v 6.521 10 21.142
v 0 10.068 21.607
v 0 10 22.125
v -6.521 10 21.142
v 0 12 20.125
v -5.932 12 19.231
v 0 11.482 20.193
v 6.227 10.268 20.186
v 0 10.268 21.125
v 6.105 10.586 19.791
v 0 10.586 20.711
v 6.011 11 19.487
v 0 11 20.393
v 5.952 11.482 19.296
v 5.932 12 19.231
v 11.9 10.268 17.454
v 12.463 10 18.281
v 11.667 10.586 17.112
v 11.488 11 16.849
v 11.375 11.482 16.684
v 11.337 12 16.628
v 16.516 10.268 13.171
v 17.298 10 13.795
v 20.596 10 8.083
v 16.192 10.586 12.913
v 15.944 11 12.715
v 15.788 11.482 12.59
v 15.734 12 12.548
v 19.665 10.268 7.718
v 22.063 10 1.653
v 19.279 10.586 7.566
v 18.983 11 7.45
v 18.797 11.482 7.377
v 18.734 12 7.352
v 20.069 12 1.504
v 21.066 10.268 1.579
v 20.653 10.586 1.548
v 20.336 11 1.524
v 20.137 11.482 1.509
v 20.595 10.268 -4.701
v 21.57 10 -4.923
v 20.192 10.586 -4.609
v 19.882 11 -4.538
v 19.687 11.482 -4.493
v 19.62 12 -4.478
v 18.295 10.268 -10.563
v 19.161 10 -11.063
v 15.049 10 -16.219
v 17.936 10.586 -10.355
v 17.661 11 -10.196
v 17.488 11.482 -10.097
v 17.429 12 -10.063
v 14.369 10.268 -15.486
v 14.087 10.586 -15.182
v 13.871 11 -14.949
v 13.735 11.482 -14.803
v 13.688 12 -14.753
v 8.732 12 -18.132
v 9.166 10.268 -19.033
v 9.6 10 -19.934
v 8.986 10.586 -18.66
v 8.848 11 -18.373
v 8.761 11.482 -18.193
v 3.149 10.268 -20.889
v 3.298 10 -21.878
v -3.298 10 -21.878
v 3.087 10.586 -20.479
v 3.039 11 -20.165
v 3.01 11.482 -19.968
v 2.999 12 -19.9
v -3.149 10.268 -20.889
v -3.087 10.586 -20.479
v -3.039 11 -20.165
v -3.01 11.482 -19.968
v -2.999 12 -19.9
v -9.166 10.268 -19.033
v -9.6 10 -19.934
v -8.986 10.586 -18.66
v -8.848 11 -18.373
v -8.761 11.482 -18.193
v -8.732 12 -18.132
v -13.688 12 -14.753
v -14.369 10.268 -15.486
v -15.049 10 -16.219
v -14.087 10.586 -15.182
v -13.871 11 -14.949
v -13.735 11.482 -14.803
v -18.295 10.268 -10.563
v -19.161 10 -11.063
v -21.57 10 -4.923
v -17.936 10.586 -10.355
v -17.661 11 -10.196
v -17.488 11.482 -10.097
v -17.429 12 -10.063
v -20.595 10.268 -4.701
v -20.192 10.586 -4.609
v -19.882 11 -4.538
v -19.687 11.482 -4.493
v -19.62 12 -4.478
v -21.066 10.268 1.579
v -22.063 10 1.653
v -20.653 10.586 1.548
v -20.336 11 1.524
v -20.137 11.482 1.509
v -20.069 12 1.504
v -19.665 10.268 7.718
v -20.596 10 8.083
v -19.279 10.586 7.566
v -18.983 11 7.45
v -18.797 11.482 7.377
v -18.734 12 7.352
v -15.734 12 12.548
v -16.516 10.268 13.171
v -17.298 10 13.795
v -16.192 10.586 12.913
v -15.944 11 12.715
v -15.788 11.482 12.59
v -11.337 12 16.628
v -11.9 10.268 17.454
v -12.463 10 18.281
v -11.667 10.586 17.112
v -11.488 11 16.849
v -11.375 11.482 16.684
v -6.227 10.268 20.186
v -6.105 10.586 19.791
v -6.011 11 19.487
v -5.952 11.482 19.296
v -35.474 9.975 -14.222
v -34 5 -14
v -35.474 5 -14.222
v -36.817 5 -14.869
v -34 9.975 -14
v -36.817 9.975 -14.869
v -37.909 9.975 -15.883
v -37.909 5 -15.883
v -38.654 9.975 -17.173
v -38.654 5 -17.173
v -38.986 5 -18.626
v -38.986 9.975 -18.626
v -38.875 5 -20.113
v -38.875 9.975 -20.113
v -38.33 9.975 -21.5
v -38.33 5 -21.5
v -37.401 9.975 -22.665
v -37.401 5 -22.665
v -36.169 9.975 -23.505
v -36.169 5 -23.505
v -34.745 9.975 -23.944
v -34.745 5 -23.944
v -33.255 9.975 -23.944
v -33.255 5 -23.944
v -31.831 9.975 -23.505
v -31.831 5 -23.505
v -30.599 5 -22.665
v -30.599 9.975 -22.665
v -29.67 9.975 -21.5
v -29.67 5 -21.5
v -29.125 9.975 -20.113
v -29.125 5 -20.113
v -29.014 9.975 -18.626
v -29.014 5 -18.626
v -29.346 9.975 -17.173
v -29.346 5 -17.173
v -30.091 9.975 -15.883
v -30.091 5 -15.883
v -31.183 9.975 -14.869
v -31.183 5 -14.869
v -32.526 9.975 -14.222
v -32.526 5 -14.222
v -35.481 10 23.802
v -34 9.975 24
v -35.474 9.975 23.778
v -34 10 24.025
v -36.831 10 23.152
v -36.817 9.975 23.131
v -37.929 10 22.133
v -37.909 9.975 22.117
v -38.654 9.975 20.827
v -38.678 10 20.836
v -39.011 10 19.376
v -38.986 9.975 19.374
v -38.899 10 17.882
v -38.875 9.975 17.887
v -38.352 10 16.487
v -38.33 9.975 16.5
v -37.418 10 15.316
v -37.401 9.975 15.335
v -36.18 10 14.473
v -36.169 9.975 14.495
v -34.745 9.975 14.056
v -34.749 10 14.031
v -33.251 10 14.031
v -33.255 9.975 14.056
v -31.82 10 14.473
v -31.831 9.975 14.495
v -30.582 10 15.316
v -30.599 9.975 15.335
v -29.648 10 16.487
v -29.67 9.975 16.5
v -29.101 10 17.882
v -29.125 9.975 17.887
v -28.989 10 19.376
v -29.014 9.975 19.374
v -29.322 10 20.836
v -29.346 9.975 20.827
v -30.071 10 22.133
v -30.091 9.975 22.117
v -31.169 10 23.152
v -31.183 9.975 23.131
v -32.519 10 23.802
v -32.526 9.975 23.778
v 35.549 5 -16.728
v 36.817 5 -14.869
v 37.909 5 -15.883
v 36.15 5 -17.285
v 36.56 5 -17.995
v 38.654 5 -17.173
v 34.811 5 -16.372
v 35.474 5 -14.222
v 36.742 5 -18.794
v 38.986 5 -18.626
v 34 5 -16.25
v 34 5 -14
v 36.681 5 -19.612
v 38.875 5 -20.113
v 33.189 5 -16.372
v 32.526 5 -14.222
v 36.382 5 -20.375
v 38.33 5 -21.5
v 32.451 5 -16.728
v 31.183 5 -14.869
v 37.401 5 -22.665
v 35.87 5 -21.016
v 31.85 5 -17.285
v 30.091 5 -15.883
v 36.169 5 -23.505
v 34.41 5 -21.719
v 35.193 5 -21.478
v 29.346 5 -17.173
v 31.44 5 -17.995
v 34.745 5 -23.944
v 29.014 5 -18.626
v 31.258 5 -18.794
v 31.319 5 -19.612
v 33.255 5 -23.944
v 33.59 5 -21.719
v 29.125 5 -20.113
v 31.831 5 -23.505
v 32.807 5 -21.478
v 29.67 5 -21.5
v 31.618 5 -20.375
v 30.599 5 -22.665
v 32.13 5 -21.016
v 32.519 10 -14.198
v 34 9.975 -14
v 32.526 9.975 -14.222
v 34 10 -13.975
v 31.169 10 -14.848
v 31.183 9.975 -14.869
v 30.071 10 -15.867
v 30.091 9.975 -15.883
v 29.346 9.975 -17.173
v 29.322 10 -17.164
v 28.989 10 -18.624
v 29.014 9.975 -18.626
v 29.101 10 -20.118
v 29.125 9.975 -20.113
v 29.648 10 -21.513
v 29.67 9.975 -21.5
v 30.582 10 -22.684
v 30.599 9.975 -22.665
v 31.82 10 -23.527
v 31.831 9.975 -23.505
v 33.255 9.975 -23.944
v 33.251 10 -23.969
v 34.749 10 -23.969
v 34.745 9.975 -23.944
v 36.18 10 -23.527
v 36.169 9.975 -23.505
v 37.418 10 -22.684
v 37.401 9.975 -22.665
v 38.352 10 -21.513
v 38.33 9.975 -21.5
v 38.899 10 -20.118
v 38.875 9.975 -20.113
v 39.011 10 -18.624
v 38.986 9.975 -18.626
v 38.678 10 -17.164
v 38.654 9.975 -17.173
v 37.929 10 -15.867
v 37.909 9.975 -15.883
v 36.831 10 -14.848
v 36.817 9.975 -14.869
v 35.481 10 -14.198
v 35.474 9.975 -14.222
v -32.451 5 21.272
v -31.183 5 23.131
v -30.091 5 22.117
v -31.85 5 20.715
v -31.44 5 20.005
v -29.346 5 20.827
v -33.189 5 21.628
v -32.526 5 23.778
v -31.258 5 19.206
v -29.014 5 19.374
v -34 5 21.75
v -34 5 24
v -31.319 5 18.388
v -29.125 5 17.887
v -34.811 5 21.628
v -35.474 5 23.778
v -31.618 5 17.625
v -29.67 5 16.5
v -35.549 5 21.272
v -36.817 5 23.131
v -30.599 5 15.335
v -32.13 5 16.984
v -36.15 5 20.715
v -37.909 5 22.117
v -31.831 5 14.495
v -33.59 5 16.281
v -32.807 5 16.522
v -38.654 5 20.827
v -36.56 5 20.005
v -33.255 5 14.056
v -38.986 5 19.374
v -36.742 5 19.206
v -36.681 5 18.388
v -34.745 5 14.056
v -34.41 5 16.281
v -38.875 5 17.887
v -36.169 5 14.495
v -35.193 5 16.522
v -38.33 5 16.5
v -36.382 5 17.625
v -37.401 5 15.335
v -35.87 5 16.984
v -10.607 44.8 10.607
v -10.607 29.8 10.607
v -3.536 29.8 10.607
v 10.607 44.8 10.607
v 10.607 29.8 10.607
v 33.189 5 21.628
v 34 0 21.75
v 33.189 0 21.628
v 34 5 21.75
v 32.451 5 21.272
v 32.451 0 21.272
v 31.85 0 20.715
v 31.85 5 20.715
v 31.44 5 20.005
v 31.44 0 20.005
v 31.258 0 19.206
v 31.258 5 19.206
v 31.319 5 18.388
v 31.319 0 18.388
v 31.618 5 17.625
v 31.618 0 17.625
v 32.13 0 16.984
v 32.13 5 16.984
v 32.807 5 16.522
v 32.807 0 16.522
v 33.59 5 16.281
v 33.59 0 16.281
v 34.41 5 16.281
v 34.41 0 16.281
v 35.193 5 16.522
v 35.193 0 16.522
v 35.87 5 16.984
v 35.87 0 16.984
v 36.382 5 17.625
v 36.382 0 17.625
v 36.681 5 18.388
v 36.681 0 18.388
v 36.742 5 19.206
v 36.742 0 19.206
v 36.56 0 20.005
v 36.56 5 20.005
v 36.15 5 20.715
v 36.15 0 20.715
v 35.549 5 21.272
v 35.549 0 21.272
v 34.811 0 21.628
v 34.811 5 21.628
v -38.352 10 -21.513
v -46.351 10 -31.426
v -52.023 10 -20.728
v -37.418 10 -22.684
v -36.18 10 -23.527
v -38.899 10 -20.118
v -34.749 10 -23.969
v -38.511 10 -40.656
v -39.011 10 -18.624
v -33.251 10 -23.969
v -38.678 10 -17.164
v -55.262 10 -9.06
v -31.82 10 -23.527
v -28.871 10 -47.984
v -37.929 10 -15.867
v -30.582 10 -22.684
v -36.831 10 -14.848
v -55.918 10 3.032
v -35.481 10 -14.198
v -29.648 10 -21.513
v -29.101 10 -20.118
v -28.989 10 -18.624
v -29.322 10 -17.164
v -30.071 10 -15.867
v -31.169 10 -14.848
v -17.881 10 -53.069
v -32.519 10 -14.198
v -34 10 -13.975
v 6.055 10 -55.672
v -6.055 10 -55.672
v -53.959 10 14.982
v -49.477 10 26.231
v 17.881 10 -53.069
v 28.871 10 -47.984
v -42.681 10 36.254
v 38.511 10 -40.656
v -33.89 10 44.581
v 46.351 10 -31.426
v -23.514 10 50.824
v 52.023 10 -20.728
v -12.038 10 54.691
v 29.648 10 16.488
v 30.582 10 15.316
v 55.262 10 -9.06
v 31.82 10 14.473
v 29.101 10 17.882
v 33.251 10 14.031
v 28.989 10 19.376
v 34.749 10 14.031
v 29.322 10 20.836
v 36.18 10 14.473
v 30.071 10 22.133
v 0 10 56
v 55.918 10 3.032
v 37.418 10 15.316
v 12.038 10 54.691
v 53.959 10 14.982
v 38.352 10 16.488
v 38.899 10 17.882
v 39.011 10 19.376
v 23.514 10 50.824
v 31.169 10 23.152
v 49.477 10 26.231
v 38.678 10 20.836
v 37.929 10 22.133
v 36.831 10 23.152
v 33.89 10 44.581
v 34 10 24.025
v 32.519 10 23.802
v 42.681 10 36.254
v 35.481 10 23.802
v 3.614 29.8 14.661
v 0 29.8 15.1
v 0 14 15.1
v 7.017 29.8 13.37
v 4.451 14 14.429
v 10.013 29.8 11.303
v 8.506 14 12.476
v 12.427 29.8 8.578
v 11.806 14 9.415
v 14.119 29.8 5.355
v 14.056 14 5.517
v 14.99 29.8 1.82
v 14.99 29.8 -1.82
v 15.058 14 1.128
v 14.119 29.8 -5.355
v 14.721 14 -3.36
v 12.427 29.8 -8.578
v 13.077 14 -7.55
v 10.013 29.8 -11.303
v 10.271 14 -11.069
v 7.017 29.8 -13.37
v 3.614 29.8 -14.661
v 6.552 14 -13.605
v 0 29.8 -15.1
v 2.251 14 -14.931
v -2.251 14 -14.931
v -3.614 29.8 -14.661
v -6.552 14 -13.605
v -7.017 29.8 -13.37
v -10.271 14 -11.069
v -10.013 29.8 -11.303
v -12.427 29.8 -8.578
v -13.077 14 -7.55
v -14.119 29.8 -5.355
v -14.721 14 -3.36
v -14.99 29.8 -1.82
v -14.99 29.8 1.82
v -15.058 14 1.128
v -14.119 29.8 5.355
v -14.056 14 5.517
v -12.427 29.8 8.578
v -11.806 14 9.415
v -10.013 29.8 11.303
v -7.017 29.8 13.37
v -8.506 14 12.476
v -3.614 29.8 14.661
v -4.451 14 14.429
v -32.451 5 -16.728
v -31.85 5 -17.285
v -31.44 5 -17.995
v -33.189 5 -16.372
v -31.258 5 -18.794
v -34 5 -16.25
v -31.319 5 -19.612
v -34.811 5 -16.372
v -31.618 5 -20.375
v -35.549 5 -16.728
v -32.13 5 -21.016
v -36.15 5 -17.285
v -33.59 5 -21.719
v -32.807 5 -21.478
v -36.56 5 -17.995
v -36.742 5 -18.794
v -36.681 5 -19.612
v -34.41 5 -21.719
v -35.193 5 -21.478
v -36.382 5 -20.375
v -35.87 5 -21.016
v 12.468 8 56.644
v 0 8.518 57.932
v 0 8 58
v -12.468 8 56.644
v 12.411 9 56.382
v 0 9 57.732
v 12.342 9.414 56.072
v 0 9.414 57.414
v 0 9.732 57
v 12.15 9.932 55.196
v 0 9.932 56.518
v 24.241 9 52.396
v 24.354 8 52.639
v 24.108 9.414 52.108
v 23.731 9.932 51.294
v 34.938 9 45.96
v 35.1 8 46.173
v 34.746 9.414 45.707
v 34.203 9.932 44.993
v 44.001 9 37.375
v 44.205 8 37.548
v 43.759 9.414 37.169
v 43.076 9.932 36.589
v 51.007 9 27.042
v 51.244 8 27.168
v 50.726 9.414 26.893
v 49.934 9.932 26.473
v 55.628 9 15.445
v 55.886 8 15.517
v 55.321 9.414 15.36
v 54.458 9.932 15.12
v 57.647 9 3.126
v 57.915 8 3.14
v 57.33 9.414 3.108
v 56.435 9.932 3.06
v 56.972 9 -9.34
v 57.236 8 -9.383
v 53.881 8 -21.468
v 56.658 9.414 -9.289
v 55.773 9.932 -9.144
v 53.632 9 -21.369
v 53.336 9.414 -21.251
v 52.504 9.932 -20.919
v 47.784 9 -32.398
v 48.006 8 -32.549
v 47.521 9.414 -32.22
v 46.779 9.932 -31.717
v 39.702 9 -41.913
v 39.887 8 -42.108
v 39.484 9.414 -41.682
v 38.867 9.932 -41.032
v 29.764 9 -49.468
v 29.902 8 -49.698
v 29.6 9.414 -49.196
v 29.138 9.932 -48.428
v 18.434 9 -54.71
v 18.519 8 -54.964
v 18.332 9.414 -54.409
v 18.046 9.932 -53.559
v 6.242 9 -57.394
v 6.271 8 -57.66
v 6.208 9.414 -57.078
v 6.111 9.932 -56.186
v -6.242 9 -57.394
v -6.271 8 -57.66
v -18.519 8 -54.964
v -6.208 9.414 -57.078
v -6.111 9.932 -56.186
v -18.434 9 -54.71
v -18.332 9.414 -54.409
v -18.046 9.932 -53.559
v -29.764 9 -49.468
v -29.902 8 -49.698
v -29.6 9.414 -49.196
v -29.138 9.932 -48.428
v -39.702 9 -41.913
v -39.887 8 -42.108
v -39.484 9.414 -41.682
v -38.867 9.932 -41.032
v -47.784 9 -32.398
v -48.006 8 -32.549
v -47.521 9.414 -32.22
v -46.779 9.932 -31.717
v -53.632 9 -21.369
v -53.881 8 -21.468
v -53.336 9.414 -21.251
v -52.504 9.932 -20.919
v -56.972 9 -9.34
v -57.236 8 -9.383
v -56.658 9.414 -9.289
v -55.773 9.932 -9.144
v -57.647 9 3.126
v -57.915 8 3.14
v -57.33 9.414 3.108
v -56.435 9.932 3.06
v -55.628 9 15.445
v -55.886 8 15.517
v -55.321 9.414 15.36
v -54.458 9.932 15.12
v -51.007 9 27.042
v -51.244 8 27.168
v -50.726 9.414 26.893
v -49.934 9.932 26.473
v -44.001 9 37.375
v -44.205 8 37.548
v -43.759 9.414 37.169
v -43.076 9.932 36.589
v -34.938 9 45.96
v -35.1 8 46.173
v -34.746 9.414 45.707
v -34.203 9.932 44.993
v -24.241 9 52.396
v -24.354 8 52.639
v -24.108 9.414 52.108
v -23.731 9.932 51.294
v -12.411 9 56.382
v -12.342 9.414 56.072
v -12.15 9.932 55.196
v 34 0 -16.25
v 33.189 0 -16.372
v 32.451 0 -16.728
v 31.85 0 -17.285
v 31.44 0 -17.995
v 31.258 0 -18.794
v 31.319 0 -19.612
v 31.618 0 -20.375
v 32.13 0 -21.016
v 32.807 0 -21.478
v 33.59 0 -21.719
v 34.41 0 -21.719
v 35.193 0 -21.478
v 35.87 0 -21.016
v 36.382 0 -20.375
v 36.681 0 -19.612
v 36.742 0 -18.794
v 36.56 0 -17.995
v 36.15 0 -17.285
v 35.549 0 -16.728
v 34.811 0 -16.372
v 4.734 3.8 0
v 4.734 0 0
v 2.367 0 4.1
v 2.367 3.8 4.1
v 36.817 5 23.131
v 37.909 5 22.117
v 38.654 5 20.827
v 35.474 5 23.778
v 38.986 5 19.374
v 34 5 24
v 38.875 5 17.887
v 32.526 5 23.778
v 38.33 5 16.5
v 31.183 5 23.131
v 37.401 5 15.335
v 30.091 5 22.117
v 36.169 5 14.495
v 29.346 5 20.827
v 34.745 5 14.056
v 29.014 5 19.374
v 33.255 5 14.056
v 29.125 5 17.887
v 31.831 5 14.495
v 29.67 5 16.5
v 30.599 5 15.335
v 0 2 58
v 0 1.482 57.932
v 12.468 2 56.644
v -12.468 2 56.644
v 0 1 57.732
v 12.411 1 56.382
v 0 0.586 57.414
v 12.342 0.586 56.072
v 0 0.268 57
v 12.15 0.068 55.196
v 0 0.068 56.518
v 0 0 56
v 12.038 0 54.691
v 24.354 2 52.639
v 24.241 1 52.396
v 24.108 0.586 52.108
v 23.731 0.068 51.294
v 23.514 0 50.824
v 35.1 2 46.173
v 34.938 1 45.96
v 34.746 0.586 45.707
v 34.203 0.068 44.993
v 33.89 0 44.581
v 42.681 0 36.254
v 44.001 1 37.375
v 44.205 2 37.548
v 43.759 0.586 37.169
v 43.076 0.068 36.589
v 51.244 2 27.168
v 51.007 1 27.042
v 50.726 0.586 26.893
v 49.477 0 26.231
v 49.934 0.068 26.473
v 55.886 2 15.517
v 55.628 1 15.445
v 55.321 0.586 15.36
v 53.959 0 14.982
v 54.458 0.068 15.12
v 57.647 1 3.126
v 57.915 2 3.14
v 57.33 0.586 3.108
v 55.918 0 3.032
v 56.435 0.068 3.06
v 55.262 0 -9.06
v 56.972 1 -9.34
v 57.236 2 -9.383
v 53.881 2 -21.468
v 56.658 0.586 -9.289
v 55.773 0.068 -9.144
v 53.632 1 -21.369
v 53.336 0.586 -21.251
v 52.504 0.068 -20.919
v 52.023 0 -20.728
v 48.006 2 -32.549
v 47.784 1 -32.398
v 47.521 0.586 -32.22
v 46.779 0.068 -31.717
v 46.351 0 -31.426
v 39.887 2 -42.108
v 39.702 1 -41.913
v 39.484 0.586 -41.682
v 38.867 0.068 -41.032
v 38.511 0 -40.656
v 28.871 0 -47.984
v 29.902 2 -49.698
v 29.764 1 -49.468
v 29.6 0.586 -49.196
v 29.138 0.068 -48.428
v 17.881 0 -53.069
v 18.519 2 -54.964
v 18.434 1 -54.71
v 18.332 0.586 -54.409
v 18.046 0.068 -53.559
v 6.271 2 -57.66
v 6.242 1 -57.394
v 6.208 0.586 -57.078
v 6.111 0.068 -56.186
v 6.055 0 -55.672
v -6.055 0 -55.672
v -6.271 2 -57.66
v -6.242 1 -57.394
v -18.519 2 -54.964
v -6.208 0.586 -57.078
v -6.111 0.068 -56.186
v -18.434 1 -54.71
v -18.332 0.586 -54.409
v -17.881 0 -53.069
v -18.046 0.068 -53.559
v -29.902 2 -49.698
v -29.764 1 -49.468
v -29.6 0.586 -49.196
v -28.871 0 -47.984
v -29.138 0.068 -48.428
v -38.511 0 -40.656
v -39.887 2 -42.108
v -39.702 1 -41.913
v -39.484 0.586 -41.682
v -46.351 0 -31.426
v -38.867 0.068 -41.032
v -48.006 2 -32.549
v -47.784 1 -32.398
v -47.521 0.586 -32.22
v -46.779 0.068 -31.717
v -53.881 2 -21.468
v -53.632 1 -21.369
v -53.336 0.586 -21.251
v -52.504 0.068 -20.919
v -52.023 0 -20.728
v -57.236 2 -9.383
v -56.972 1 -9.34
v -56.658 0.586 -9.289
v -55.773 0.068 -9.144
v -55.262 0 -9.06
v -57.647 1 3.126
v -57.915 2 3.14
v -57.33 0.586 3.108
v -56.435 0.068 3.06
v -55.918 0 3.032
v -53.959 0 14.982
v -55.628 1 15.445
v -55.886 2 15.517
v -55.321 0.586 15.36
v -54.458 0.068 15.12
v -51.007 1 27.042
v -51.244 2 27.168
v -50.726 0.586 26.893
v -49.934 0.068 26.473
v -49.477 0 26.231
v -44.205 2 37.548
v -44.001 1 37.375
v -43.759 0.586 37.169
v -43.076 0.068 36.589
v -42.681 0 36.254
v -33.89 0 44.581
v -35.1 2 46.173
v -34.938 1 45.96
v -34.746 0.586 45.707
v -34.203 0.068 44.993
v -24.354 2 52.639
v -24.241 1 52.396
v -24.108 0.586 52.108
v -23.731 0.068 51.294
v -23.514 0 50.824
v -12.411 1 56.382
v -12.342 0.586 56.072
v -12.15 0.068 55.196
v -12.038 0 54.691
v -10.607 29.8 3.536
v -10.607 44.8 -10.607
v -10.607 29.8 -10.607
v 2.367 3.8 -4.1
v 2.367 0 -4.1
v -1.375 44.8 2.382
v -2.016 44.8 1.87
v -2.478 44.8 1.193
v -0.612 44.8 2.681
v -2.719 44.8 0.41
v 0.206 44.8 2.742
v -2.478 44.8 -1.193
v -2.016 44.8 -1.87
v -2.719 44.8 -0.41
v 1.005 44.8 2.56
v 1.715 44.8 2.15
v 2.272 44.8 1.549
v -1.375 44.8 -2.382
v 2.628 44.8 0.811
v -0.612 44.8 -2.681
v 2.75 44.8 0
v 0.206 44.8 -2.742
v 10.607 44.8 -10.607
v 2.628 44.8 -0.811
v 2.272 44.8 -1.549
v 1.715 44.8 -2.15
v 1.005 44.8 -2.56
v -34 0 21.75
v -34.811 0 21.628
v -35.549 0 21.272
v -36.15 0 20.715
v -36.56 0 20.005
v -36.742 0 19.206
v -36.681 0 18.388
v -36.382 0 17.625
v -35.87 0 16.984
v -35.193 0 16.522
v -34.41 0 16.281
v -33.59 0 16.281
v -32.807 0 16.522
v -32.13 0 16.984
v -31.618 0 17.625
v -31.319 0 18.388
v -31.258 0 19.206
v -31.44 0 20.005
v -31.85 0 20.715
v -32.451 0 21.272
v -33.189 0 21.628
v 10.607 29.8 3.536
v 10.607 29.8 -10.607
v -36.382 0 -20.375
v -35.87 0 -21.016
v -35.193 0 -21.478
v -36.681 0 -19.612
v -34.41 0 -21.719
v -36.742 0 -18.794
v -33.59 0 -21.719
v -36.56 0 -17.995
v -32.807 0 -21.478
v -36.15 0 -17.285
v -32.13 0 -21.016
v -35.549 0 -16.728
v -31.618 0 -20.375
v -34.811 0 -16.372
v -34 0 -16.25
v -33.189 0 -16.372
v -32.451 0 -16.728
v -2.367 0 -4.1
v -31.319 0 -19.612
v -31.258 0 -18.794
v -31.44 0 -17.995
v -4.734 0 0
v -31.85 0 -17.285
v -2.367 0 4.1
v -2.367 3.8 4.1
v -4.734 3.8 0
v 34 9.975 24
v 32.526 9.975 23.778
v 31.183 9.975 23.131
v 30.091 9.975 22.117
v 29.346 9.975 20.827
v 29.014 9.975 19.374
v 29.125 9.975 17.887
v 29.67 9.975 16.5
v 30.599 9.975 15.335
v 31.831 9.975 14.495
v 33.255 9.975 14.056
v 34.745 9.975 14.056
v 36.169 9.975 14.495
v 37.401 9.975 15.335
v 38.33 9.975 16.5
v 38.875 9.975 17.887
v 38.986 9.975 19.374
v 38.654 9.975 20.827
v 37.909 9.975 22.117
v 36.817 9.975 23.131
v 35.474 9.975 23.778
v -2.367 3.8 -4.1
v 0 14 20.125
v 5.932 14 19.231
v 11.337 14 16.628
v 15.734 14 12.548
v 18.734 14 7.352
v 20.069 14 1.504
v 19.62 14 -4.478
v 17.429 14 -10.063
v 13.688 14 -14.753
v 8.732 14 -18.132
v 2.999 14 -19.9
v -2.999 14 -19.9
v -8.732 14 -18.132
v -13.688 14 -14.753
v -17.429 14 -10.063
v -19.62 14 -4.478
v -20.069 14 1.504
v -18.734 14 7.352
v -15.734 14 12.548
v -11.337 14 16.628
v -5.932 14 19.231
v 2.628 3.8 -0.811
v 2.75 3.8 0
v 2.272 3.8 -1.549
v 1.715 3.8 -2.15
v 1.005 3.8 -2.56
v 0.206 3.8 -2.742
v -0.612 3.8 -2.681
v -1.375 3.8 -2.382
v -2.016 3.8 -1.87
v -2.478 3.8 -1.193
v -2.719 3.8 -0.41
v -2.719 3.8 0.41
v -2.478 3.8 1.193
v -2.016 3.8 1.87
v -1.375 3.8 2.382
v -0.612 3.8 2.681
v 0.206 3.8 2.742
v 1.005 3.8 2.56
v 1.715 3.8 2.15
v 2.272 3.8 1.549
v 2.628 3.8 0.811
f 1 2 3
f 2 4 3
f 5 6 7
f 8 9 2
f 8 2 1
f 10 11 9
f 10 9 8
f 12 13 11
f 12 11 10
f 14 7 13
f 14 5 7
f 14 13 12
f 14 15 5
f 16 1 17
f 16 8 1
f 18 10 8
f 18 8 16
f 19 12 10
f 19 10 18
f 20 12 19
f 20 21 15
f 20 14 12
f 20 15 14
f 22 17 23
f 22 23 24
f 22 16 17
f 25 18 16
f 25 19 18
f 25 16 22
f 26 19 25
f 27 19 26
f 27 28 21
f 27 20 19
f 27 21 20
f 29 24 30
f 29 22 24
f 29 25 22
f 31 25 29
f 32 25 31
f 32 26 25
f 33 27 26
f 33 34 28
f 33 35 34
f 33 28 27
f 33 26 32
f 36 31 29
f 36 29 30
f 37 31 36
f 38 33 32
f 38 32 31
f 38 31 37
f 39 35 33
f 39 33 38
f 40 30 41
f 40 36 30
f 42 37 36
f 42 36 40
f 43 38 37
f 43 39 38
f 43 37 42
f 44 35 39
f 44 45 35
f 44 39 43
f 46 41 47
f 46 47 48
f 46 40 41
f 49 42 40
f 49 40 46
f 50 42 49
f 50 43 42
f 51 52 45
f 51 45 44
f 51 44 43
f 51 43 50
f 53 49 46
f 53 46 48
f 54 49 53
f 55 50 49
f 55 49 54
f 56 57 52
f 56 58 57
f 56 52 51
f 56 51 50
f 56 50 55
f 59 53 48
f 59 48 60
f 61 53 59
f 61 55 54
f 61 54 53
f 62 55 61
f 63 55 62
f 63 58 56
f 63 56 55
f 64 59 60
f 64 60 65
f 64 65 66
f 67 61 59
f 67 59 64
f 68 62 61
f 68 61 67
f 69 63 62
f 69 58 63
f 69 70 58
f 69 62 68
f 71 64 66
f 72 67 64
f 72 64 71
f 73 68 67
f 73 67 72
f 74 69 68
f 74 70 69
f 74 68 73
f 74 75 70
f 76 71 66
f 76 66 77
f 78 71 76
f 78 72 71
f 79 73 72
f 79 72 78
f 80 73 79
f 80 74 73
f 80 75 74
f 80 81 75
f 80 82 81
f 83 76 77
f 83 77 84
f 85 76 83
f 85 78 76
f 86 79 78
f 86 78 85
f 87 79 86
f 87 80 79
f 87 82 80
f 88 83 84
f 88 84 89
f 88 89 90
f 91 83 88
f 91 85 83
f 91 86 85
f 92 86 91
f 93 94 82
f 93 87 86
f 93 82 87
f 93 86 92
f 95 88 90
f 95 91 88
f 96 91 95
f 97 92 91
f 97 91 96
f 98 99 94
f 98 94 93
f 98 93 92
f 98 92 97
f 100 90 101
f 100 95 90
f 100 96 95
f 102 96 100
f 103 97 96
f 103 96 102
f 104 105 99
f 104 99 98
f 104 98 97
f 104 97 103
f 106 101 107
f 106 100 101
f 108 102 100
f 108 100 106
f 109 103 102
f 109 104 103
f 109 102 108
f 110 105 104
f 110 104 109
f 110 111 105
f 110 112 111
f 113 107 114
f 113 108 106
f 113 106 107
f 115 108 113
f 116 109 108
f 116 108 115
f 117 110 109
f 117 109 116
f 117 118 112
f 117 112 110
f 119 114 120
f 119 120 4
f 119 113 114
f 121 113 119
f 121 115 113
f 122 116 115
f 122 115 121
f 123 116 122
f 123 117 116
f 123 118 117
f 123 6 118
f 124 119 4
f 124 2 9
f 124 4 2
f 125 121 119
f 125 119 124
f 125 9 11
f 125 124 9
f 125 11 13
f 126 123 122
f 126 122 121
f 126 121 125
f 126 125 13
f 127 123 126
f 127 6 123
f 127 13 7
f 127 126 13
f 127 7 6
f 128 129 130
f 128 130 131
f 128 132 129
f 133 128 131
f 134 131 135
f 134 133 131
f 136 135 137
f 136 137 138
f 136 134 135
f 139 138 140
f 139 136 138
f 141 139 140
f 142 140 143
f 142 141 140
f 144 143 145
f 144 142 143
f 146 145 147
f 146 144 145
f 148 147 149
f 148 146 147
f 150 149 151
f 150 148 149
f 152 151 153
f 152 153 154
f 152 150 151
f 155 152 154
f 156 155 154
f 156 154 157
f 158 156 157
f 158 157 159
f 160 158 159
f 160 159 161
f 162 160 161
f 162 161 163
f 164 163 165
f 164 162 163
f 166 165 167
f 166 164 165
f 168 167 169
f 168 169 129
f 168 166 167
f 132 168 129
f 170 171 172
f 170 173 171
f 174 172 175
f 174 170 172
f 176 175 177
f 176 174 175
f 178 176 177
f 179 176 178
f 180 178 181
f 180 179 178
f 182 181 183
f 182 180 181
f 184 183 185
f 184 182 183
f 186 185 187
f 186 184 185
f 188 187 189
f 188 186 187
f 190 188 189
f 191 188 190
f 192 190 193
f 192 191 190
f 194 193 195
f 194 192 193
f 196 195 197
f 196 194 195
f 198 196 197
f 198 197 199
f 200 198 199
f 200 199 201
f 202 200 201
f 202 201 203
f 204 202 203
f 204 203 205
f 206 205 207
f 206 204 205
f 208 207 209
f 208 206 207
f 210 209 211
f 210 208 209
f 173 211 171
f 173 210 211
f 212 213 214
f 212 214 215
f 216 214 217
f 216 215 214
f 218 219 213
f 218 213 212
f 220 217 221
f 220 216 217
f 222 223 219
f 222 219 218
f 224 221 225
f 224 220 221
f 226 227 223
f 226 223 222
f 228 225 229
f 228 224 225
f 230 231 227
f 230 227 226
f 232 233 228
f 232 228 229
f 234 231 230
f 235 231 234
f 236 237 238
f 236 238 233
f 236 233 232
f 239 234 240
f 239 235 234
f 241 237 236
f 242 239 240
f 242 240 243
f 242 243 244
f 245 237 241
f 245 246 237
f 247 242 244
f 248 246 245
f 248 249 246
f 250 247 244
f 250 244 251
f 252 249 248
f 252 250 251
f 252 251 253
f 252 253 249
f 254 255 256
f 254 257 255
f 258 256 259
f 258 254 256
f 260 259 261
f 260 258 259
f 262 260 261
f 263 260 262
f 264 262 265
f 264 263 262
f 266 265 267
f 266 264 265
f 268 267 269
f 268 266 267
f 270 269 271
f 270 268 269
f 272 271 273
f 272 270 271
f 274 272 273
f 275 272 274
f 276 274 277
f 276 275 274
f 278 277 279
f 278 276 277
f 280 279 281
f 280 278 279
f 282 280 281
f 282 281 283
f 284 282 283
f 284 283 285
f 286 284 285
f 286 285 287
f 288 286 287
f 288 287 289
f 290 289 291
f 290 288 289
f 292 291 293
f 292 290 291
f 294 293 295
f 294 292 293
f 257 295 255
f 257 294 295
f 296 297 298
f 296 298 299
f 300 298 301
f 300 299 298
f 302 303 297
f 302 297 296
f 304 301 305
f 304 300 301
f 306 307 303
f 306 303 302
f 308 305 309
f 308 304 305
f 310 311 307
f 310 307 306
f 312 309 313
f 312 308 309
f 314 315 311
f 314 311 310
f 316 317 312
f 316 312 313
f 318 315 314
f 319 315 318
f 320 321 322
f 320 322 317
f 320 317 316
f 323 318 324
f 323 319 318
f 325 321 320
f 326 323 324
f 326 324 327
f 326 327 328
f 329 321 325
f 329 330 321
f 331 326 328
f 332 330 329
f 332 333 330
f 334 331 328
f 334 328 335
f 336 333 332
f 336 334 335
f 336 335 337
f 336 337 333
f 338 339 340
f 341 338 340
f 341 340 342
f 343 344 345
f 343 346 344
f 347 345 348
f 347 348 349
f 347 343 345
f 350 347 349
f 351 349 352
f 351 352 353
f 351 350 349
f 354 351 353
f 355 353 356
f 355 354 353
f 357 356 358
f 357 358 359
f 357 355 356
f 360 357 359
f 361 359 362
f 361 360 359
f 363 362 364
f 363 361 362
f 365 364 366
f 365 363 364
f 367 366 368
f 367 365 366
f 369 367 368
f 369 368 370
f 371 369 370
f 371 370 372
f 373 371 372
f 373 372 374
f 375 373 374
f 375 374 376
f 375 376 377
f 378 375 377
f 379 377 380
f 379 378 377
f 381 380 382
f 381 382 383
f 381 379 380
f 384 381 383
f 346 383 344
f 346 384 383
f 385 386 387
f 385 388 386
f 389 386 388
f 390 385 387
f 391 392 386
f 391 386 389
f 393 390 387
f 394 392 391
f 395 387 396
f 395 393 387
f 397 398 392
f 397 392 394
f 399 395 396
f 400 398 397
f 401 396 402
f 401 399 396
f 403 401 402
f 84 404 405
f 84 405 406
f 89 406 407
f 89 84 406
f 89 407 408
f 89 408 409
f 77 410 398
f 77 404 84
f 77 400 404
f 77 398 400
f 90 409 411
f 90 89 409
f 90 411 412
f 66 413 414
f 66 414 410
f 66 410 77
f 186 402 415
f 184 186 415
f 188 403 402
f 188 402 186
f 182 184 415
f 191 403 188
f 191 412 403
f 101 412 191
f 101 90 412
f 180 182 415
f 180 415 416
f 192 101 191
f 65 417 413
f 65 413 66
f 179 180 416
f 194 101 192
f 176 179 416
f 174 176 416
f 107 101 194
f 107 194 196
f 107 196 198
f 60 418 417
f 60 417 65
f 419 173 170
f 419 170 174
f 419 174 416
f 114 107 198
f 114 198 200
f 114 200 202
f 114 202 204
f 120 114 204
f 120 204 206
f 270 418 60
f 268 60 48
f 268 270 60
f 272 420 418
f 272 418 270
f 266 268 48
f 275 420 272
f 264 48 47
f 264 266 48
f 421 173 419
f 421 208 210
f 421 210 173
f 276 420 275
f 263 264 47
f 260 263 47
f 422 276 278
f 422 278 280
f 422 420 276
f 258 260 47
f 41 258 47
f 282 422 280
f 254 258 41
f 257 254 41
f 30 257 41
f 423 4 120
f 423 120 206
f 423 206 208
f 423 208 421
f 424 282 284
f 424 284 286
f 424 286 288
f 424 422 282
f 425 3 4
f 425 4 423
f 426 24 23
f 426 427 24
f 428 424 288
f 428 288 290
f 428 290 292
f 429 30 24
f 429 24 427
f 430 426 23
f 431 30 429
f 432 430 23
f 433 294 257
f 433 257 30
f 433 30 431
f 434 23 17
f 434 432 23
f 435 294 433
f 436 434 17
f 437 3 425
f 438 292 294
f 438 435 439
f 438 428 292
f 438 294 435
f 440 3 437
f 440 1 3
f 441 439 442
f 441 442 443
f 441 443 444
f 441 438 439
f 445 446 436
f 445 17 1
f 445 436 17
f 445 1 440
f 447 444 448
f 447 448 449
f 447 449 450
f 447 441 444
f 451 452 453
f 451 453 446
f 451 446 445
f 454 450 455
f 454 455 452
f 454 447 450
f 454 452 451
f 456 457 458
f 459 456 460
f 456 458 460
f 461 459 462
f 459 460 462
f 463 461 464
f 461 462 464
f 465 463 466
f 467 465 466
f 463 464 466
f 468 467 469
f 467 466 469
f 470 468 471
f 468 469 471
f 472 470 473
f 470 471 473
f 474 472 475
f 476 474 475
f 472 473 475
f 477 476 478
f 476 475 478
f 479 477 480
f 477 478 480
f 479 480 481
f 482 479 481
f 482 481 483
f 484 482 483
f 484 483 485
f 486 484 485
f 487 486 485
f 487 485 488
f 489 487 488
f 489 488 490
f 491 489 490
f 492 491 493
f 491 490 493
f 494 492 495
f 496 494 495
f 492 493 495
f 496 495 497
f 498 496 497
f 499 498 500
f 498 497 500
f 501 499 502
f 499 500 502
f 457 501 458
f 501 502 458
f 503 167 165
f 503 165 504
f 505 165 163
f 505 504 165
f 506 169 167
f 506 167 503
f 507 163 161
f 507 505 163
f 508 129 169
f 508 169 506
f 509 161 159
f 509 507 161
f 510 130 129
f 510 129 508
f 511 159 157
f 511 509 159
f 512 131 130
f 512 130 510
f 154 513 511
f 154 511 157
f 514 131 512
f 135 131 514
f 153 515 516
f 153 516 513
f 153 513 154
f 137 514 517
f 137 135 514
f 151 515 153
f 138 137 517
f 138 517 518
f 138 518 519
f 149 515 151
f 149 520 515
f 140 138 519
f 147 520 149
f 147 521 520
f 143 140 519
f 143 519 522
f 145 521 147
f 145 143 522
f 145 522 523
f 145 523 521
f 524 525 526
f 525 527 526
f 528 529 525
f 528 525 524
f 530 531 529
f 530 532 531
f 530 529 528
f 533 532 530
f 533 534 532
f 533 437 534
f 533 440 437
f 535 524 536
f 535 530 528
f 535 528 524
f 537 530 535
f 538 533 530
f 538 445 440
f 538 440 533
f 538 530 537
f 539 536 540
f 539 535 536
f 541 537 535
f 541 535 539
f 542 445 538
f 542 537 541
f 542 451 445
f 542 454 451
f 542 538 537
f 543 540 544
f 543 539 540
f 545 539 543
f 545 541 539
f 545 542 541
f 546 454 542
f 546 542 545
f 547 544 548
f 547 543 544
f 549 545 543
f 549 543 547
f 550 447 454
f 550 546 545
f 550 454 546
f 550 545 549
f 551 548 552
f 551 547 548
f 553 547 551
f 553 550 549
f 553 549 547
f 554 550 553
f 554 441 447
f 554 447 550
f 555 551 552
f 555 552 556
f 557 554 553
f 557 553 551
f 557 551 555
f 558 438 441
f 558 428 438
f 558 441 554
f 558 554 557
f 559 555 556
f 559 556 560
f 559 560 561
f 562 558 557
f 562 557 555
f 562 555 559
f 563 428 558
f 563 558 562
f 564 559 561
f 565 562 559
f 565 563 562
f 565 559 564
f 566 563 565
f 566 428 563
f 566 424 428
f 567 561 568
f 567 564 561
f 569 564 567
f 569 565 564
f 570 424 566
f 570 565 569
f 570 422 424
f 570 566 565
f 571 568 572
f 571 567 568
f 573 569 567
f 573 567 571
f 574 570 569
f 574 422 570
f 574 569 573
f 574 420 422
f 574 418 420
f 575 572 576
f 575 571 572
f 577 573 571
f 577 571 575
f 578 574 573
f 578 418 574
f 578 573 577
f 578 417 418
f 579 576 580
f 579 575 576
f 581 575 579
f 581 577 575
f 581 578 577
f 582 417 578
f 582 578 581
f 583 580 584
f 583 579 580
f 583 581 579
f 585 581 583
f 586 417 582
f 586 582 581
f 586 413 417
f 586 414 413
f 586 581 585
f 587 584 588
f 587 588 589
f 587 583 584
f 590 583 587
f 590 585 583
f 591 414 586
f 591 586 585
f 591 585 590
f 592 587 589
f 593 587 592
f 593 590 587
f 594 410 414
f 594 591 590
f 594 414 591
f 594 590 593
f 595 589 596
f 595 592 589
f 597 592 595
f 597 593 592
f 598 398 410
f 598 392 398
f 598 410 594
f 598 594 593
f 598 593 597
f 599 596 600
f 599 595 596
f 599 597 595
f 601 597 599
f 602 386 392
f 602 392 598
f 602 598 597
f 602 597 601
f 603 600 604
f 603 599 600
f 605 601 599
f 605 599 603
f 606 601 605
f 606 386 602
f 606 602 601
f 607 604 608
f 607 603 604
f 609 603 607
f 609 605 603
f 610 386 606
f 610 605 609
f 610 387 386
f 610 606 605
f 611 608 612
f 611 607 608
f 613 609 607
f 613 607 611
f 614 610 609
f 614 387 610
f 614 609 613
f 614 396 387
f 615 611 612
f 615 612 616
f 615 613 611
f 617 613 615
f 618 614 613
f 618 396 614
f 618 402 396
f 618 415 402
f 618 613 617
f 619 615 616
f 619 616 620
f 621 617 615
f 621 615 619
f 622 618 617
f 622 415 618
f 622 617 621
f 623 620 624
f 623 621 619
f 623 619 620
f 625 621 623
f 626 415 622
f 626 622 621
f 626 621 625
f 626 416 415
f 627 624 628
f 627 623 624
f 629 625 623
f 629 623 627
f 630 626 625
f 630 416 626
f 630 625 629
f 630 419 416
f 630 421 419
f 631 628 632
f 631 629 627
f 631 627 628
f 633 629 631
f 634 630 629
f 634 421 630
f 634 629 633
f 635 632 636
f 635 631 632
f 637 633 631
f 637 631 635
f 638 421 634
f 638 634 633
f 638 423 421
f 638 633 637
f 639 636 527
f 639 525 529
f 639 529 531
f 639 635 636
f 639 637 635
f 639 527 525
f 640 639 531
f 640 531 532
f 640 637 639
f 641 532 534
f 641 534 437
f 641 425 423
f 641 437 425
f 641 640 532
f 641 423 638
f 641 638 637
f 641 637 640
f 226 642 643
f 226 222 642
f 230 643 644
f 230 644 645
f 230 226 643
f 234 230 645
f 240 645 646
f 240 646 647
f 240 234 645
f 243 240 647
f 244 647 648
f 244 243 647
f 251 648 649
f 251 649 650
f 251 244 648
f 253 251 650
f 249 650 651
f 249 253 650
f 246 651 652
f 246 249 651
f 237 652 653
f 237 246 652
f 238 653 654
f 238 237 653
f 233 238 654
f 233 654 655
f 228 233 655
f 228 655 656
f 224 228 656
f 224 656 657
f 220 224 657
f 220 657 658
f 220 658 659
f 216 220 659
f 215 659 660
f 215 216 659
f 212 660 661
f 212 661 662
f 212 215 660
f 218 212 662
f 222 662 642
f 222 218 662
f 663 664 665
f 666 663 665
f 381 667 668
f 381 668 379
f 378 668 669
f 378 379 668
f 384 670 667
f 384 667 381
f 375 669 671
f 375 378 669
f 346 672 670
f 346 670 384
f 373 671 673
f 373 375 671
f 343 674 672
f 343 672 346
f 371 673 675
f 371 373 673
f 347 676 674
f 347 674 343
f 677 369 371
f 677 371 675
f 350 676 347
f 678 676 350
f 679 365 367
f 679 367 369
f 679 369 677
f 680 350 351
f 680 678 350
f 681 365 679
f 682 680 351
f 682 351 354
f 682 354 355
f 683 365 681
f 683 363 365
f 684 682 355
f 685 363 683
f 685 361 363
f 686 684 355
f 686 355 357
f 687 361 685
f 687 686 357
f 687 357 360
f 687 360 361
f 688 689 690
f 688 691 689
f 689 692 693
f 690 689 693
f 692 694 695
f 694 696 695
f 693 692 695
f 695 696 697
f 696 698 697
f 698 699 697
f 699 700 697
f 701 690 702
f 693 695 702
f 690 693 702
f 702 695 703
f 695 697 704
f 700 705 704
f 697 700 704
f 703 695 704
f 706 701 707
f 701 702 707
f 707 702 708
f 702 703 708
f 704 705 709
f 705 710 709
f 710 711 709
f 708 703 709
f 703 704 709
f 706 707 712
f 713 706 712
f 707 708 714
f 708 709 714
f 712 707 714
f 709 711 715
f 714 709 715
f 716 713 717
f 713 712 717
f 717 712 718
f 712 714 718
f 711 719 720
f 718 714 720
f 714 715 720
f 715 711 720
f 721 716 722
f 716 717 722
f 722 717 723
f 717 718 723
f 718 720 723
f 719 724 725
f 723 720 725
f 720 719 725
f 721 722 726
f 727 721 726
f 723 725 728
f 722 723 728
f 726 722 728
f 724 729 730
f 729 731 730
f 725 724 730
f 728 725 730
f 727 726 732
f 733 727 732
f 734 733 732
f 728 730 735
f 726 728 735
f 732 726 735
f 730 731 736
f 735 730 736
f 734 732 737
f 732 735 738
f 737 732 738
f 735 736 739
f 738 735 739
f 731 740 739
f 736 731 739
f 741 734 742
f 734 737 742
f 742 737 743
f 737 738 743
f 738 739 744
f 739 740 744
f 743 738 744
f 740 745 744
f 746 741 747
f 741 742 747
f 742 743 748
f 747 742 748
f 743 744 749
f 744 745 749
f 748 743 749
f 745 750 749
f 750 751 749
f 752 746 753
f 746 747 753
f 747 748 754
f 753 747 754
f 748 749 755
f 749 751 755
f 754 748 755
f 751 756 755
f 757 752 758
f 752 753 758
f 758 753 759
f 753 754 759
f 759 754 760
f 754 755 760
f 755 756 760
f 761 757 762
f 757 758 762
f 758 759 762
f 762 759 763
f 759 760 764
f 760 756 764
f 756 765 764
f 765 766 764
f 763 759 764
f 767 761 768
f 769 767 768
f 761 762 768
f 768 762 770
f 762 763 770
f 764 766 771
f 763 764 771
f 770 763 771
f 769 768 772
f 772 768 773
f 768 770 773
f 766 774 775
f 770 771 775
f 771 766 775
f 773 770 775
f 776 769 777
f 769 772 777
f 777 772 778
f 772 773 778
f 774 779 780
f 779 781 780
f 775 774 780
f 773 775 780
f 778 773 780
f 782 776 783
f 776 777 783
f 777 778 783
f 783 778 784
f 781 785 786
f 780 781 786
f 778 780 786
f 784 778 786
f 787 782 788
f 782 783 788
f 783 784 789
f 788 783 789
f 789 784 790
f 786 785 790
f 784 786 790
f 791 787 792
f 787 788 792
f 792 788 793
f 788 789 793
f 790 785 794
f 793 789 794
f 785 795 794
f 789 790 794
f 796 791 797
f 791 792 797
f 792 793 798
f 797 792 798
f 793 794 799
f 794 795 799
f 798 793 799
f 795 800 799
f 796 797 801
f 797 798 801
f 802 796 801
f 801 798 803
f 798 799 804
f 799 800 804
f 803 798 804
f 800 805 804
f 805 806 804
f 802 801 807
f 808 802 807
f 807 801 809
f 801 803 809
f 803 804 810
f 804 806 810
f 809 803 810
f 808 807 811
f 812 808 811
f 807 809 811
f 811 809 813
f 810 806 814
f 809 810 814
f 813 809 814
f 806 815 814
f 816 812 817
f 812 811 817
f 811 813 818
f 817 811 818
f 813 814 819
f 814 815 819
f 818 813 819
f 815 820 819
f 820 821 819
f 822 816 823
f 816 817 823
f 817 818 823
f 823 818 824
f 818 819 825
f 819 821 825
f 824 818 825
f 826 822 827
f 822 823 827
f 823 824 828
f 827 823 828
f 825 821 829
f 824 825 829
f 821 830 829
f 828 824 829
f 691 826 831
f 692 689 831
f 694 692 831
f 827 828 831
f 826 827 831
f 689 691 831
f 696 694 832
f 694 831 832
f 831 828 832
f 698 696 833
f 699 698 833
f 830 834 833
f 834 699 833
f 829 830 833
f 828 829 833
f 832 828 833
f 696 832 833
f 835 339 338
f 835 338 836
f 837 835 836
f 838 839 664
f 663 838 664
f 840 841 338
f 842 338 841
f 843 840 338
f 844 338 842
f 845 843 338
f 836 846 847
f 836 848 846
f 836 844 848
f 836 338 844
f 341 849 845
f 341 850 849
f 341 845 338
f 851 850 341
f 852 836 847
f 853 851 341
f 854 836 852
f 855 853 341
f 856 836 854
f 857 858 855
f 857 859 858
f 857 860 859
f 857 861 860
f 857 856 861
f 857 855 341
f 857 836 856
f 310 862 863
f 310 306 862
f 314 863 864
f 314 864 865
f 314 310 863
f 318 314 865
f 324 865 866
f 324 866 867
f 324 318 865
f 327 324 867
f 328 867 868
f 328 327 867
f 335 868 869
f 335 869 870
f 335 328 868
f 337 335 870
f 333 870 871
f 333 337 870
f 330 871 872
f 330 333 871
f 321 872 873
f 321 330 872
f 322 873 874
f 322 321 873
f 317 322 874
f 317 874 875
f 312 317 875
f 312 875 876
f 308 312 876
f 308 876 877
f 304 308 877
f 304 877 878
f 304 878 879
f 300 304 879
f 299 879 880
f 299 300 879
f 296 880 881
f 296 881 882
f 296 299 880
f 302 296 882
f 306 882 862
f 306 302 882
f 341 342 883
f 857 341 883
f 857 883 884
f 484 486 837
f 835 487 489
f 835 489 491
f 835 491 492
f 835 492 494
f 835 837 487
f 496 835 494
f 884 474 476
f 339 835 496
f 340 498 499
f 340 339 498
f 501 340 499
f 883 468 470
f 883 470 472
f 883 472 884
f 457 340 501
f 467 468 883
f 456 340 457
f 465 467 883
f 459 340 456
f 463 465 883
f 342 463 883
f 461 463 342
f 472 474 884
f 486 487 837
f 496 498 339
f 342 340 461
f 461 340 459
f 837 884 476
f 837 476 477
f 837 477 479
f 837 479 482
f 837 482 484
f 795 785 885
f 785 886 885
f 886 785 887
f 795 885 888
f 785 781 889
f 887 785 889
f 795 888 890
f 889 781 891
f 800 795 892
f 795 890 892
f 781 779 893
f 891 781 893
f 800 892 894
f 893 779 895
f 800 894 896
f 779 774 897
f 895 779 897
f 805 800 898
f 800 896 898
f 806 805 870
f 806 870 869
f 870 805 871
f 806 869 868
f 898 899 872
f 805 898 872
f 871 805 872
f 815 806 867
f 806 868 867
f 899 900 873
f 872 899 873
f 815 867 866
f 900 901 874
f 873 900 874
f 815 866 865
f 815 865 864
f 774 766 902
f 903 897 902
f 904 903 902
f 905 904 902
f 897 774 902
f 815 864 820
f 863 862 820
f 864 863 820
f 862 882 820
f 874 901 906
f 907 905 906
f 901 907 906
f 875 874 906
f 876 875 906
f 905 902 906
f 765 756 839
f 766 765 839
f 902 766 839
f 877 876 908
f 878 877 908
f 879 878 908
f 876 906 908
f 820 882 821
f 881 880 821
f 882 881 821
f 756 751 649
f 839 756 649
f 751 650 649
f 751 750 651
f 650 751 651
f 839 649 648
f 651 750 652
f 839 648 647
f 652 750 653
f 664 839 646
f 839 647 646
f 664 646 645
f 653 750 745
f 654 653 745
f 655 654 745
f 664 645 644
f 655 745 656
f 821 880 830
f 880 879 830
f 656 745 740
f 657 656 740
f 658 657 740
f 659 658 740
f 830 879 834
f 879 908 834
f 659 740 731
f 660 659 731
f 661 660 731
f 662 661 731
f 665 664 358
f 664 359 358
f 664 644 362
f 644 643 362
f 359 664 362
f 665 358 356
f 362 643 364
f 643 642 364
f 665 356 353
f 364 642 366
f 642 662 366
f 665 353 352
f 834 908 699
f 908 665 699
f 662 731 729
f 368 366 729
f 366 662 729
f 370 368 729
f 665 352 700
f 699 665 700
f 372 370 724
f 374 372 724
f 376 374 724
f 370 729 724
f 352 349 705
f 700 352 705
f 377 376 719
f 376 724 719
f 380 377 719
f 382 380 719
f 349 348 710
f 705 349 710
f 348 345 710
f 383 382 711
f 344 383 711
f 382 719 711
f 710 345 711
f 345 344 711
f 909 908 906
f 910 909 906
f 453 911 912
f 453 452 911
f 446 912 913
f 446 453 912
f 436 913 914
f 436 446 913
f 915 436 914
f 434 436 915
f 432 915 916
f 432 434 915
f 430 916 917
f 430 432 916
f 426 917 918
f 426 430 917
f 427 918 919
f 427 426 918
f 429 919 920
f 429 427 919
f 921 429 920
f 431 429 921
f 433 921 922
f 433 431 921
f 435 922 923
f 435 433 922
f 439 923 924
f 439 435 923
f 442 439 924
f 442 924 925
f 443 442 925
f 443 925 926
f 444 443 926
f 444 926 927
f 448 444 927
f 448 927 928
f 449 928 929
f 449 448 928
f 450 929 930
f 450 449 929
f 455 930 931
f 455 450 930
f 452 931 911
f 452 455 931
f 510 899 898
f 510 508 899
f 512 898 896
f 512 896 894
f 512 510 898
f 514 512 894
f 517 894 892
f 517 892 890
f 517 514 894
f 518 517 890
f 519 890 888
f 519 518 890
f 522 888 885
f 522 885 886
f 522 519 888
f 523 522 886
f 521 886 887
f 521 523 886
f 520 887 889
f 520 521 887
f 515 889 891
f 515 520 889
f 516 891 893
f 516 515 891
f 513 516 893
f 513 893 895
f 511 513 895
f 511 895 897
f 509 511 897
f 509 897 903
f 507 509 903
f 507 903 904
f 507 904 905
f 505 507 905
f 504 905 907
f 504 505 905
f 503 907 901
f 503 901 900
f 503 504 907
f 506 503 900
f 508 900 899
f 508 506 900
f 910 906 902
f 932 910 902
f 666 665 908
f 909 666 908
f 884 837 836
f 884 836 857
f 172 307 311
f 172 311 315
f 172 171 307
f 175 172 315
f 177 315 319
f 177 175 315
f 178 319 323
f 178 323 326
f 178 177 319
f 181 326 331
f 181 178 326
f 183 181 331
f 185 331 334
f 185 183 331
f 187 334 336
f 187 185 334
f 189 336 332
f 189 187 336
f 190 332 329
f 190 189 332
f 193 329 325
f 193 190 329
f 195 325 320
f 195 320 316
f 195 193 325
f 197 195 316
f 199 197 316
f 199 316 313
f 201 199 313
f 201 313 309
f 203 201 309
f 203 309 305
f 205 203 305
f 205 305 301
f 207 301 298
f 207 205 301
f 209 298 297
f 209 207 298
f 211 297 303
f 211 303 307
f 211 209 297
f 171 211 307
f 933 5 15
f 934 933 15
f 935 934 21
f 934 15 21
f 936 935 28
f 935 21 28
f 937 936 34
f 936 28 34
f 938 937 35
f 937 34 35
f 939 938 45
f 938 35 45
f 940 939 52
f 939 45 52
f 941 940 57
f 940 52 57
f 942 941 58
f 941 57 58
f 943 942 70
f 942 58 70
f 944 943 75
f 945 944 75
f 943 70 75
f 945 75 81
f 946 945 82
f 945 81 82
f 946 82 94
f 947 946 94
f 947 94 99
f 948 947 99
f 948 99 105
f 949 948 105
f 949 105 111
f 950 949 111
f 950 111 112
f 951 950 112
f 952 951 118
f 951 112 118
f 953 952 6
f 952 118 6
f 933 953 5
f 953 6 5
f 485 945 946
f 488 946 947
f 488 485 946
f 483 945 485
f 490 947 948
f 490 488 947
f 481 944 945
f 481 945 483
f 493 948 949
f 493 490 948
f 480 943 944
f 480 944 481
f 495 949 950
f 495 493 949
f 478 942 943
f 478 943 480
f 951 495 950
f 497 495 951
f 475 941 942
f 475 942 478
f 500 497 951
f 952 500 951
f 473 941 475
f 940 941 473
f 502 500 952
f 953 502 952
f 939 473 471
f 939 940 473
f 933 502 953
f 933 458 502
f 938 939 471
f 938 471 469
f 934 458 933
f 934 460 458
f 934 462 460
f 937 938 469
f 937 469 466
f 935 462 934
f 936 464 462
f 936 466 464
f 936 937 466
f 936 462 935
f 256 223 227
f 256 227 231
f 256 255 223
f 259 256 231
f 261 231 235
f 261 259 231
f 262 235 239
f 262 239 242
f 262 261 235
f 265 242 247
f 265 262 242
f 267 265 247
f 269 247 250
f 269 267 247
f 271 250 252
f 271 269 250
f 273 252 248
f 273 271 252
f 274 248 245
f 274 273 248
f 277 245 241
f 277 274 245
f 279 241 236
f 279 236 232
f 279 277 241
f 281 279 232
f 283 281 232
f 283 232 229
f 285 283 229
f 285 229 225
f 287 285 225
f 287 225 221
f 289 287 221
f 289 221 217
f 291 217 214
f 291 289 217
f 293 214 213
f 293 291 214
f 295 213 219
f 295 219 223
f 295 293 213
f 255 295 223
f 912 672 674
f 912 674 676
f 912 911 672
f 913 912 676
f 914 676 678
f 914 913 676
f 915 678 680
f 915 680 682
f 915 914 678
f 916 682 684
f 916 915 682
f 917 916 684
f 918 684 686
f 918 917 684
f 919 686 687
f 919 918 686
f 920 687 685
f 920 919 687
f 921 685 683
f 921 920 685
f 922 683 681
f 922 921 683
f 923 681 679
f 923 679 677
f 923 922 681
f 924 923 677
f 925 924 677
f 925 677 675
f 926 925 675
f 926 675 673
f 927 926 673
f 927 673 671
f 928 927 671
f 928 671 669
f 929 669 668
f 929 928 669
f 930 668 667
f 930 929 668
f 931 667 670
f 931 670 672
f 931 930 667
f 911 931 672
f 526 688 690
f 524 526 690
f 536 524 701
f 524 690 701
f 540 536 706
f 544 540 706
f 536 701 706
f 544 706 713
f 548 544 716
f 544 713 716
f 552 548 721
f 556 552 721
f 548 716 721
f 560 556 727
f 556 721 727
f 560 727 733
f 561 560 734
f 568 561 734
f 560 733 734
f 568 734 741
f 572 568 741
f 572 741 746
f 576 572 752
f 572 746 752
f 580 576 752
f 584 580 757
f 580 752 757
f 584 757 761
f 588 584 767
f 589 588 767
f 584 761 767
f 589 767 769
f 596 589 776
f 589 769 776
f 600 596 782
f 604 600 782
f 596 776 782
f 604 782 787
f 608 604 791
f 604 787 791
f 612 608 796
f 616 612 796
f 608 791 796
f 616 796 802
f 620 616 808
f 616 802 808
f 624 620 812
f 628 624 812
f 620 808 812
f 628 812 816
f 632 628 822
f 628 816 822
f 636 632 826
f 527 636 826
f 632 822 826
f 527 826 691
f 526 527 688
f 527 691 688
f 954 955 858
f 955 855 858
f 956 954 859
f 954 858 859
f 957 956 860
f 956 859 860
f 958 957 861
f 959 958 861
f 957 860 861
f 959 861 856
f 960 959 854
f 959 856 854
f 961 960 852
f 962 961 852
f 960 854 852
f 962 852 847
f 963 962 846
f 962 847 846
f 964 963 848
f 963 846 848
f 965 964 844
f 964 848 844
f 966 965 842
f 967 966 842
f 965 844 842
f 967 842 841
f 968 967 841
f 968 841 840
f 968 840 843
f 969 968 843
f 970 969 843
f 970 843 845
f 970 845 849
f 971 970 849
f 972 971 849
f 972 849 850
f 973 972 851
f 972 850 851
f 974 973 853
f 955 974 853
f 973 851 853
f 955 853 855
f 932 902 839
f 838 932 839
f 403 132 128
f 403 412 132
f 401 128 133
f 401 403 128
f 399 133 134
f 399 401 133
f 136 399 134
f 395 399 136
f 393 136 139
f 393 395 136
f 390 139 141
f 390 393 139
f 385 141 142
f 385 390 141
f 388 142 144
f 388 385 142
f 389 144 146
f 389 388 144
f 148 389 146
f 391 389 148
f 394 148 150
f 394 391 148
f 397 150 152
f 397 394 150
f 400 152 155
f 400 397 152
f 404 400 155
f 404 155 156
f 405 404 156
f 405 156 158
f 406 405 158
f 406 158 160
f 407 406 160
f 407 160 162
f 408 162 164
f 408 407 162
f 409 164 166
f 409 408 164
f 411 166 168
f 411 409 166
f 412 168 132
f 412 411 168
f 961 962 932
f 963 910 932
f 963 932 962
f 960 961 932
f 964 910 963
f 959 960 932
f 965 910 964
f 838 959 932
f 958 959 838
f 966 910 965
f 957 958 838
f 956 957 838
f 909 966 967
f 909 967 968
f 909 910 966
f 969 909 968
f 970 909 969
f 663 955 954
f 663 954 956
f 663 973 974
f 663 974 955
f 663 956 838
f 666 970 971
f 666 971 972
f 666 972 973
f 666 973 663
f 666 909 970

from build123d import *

# Parameters (mm, degrees)
SKETCH1_R                      = 58
BOSS_EXTRUDE1_DEPTH            = 10
CBORE_FOR_M5_SHCS3_AT_2_COUNT  = 2
CBORE_FOR_M5_SHCS3_AT_2_PITCH  = 68
CBORE_FOR_M5_SHCS3_AT_3_COUNT  = 2
CBORE_FOR_M5_SHCS3_AT_3_PITCH  = 38
CBORE_FOR_M5_SHCS3_AT_4_COUNT  = 2
CBORE_FOR_M5_SHCS3_AT_4_PITCH  = 77.897368377
SKETCH5_R                      = 20.125
BOSS_EXTRUDE3_DEPTH            = 4
SKETCH4_R                      = 15.1
BOSS_EXTRUDE2_DEPTH            = 15.8
FILLET1_R                      = 2
FILLET2_R                      = 2
SKETCH7_W                      = 21.213203436
SKETCH7_H                      = 21.213203436
BOSS_EXTRUDE4_DEPTH            = 15
M5_CLEARANCE_HOLE1_D           = 5.5
M5_CLEARANCE_HOLE1_CSINK_D     = 5.55
M5_CLEARANCE_HOLE1_CSINK_ANGLE = 90
CUT_EXTRUDE1_DEPTH             = 3.8


with BuildPart() as part:
    # Sketch1 → Boss-Extrude1 (new body)
    with BuildSketch(Plane(origin=(0, 0, 0), x_dir=(1, 0, 0), z_dir=(0, 1, 0))):
        with Locations(Location((0, 0, 0), (0, 0, 270))):
            Circle(SKETCH1_R)
    extrude(amount=BOSS_EXTRUDE1_DEPTH)

    # Sketch3 → CBORE for M5 SHCS3 (revolve, cut)
    with BuildSketch(Plane(origin=(-34, 10, -19), x_dir=(0, 0, 1), z_dir=(1, 0, 0))):
        Polygon((0, 0), (0, 10), (2.75, 10), (2.75, 5), (5, 5), (5, 0.025), (5.025, 0), align=None)
    cbore_for_m5_shcs3 = revolve(axis=Axis((-34, 16.35, -19), (0, -1, 0)), mode=Mode.SUBTRACT)

    # CBORE for M5 SHCS3 at 2: CBORE for M5 SHCS3 ×2
    with Locations(*[(i * CBORE_FOR_M5_SHCS3_AT_2_PITCH, 0, 0) for i in range(1, CBORE_FOR_M5_SHCS3_AT_2_COUNT)]):
        add(cbore_for_m5_shcs3, mode=Mode.SUBTRACT)

    # CBORE for M5 SHCS3 at 3: CBORE for M5 SHCS3 ×2
    with Locations(*[(0, 0, i * CBORE_FOR_M5_SHCS3_AT_3_PITCH) for i in range(1, CBORE_FOR_M5_SHCS3_AT_3_COUNT)]):
        add(cbore_for_m5_shcs3, mode=Mode.SUBTRACT)

    # CBORE for M5 SHCS3 at 4: CBORE for M5 SHCS3 ×2
    with Locations(*[Vector(0.8729434821372646, 0, 0.48782135766494195) * (i * CBORE_FOR_M5_SHCS3_AT_4_PITCH) for i in range(1, CBORE_FOR_M5_SHCS3_AT_4_COUNT)]):
        add(cbore_for_m5_shcs3, mode=Mode.SUBTRACT)

    # Sketch5 → Boss-Extrude3 (add)
    with BuildSketch(Plane(origin=(0, 10, 0), x_dir=(1, 0, 0), z_dir=(0, 1, 0))):
        with Locations(Location((0, 0, 0), (0, 0, 270))):
            Circle(SKETCH5_R)
    extrude(amount=BOSS_EXTRUDE3_DEPTH)

    # Sketch4 → Boss-Extrude2 (add)
    with BuildSketch(Plane(origin=(0, 14, 0), x_dir=(1, 0, 0), z_dir=(0, 1, 0))):
        with Locations(Location((0, 0, 0), (0, 0, 270))):
            Circle(SKETCH4_R)
    extrude(amount=BOSS_EXTRUDE2_DEPTH)

    # Fillet1
    fillet1_edges = [part.edges().sort_by_distance(p)[0] for p in [
        (0, 0, -58),
        (0, 10, -58),
    ]]
    fillet(fillet1_edges, radius=FILLET1_R)

    # Fillet2
    fillet2_edges = [part.edges().sort_by_distance(p)[0] for p in [
        (0, 10, -20.125),
    ]]
    fillet(fillet2_edges, radius=FILLET2_R)

    # Sketch7 → Boss-Extrude4 (add)
    with BuildSketch(Plane(origin=(0, 29.8, 0), x_dir=(1, 0, 0), z_dir=(0, 1, 0))):
        Rectangle(SKETCH7_W, SKETCH7_H)
    extrude(amount=BOSS_EXTRUDE4_DEPTH)

    # M5 Clearance Hole1 (through all)
    with Locations(Plane(origin=(0, 0, 0), x_dir=(-1, 0, 0), z_dir=(0, -1, 0))):
        with Locations((0, 0)):
            CounterSinkHole(M5_CLEARANCE_HOLE1_D / 2, M5_CLEARANCE_HOLE1_CSINK_D / 2, counter_sink_angle=M5_CLEARANCE_HOLE1_CSINK_ANGLE)

    # Sketch10 → Cut-Extrude1 (cut)
    with BuildSketch(Plane.XZ):
        Polygon((2.367136104, 4.1), (-2.367136104, 4.1), (-4.734272207, 0), (-2.367136104, -4.1), (2.367136104, -4.1), (4.734272207, 0), align=None)
    extrude(amount=-CUT_EXTRUDE1_DEPTH, mode=Mode.SUBTRACT)


solid = part.part
